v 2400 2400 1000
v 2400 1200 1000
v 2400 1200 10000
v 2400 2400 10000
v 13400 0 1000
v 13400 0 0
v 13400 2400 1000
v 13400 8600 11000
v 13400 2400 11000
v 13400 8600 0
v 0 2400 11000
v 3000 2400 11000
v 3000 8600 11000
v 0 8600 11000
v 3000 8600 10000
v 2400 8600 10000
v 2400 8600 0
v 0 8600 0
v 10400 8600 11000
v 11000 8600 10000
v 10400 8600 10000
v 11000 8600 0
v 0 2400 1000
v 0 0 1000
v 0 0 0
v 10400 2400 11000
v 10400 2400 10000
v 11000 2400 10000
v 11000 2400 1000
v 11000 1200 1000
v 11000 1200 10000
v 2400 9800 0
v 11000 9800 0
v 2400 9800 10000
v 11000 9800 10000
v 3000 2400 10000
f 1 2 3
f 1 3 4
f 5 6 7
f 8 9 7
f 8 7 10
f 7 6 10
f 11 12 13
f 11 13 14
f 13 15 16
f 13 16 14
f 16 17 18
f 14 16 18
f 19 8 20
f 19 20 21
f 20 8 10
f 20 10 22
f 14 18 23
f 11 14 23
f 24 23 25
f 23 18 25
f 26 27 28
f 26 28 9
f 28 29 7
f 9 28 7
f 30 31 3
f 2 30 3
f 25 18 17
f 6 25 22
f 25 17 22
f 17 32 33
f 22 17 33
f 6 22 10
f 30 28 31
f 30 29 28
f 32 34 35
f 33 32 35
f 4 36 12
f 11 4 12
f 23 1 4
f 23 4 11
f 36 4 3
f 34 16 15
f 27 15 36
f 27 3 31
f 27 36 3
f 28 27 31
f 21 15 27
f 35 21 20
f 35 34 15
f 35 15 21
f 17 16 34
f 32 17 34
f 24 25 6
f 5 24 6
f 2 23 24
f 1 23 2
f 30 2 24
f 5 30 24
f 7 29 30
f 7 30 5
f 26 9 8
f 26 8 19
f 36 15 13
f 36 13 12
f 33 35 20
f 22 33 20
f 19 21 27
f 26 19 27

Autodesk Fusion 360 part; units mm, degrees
sketch "Sketch1" plane through (0, 0, 0) normal (0, 0, 1) x (1, 0, 0)
  line L0 (0, 0) -> (13400, 0)
  line L1 (13400, 0) -> (13400, 8600)
  line L2 (13400, 8600) -> (0, 8600)
  line L3 (0, 8600) -> (0, 0)
extrude "Extrude1" add sketch "Sketch1" along normal blind 1000
sketch "Sketch2" plane through (0, 0, 1000) normal (0, 0, 1) x (-1, 0, 0)
  line L0 (0, -8600) -> (0, 0)
  line L1 (0, 0) -> (-13400, 0)
  line L2 (-13400, 0) -> (-13400, -8600)
  line L3 (-13400, -8600) -> (0, -8600)
  line L4 (0, -8600) -> (-3000, -8600)
  line L5 (-3000, -8600) -> (-3000, -2400)
  line L6 (-3000, -2400) -> (0, -2400)
  line L7 (0, -2400) -> (0, -8600)
  line L8 (-13400, -8600) -> (-10400, -8600)
  line L9 (-10400, -8600) -> (-10400, -2400)
  line L10 (-10400, -2400) -> (-13400, -2400)
  line L11 (-13400, -2400) -> (-13400, -8600)
extrude "Extrude2" add sketch "Sketch2" along normal blind 10000 contours L0 L3 L4 L5 L6 L7 | L2 L3 L8 L9 L10 L11
sketch "Sketch3" plane through (0, 0, 0) normal (0, 0, 1) x (1, 0, 0)
  line L0 (2400, 9800) -> (11000, 9800)
  line L1 (11000, 9800) -> (11000, 1200)
  line L2 (11000, 1200) -> (2400, 1200)
  line L3 (2400, 1200) -> (2400, 9800)
  line L4 (0, 2400) -> (3000, 2400)
  line L5 (3000, 2400) -> (3000, 8600)
  line L6 (3000, 8600) -> (0, 8600)
  line L7 (0, 8600) -> (0, 2400)
  line L8 (13400, 2400) -> (13400, 8600)
  line L9 (13400, 8600) -> (10400, 8600)
  line L10 (10400, 8600) -> (10400, 2400)
  line L11 (10400, 2400) -> (13400, 2400)
extrude "Extrude3" add sketch "Sketch3" along normal blind 10000 contours L0 L1 L2 L3 L4 L5 L6 L9 L10 L11
